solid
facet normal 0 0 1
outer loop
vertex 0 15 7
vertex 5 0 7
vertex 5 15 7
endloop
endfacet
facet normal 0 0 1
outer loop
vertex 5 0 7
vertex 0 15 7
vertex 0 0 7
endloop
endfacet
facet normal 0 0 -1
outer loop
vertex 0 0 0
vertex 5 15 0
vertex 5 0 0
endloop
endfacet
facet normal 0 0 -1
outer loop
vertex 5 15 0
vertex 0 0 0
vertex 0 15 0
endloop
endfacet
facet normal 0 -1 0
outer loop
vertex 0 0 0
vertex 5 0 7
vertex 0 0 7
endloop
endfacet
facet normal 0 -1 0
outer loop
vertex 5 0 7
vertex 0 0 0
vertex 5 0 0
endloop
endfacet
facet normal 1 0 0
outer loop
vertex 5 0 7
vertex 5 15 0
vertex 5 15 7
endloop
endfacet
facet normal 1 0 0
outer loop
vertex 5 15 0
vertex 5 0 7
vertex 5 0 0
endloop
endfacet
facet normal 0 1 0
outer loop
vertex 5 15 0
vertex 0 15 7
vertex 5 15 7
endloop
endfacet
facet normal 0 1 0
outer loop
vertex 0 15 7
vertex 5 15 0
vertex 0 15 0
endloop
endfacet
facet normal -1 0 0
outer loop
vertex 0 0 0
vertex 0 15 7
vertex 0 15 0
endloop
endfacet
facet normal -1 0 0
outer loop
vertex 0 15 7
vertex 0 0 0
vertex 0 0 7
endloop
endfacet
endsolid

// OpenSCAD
// Generated by SolidPython 1.0.1 on 2020-07-29 00:46:54


cube(size = [5, 15, 7]);
/***********************************************
*********      SolidPython code:      **********
************************************************
 
# import packages: SolidPython
from solid import *
from solid.utils import *
from itertools import chain, combinations, permutations


class Resize:

    def __init__(self, scad_file):
        self.scad_file = scad_file
        #self.scad_file = import_scad(scad_file)
        # cone/cylinder param:
        self.r1 = 0
        self.r2 = 0
        self.h = 0
        # rectangular prism param:
        self.w = 0
        self.l = 0
        # ellipse param:
        self.r = 0

    # import OpenScad code (file name corresponds to shape)


    # classify shape + parameters
    def assign(self, param1, param2, param3):
        if self.scad_file == 'cone.scad':
            self.r1 = param1
            self.r2 = param2
            self.h = param3
        elif self.scad_file == 'cylinder.scad':
            self.r1 = param1
            self.r2 = param2
            self.h = param3
        elif self.scad_file == 'rectangularPrism.scad':
            self.h = param1
            self.l = param2
            self.w = param3
        else:
            self.r = param1
            self.h = param2

    # resize parameters
    def iterate(self):
        x = range(3, 20, 2)
        i = 1
        if self.scad_file == 'cone.scad':
            tempList = list(permutations(x, 2))
            for temp in tempList:
                param1 = temp[0]
                param2 = temp[1]
                filepath = 'produced_scad_files/' + 'cone' + str(param1) + '_' + str(param2) + '_' + '.scad'
                scad_render_to_file(cylinder(h=param1, r1=param2, r2=0), filepath)

        elif self.scad_file == 'cylinder.scad':
            tempList = list(permutations(x, 3))
            for temp in tempList:
                param1 = temp[0]
                param2 = temp[1]
                filepath = 'produced_scad_files/' + 'cylinder' + str(param1) + '_' + str(param2) + '_' + '.scad'
                scad_render_to_file(cylinder(h=param1, r1=param2, r2=param2), filepath)

        elif self.scad_file == 'rectangularPrism.scad':
            tempList = list(permutations(x, 3))
            for temp in tempList:
                param1 = temp[0]
                param2 = temp[1]
                param3 = temp[2]
                filepath = 'produced_scad_files/' + 'rectangularPrism' + str(param1) + '_' + str(param2) + '_' + str(
                    param3) + '.scad'
                scad_render_to_file(cube(size=(param1, param2, param3)), filepath)

        elif self.scad_file == 'ellipse.scad':
            tempList = list(permutations(x, 4))
            for temp in tempList:
                param1 = temp[0]
                param2 = temp[1]
                param3 = temp[2]
                param4 = temp[3]
                filepath = 'produced_scad_files/' + 'ellipse' + str(param1) + '_' + str(param2) + '_' + str(param3) + '_' + str(param4) + '.scad'
                scad_render_to_file(scale([param1, param2, param3])(sphere(r=param4)), filepath)

    def render_to_scadfile(self):
        scad_render_to_file(scad, 'example.scad') 
 
************************************************/
